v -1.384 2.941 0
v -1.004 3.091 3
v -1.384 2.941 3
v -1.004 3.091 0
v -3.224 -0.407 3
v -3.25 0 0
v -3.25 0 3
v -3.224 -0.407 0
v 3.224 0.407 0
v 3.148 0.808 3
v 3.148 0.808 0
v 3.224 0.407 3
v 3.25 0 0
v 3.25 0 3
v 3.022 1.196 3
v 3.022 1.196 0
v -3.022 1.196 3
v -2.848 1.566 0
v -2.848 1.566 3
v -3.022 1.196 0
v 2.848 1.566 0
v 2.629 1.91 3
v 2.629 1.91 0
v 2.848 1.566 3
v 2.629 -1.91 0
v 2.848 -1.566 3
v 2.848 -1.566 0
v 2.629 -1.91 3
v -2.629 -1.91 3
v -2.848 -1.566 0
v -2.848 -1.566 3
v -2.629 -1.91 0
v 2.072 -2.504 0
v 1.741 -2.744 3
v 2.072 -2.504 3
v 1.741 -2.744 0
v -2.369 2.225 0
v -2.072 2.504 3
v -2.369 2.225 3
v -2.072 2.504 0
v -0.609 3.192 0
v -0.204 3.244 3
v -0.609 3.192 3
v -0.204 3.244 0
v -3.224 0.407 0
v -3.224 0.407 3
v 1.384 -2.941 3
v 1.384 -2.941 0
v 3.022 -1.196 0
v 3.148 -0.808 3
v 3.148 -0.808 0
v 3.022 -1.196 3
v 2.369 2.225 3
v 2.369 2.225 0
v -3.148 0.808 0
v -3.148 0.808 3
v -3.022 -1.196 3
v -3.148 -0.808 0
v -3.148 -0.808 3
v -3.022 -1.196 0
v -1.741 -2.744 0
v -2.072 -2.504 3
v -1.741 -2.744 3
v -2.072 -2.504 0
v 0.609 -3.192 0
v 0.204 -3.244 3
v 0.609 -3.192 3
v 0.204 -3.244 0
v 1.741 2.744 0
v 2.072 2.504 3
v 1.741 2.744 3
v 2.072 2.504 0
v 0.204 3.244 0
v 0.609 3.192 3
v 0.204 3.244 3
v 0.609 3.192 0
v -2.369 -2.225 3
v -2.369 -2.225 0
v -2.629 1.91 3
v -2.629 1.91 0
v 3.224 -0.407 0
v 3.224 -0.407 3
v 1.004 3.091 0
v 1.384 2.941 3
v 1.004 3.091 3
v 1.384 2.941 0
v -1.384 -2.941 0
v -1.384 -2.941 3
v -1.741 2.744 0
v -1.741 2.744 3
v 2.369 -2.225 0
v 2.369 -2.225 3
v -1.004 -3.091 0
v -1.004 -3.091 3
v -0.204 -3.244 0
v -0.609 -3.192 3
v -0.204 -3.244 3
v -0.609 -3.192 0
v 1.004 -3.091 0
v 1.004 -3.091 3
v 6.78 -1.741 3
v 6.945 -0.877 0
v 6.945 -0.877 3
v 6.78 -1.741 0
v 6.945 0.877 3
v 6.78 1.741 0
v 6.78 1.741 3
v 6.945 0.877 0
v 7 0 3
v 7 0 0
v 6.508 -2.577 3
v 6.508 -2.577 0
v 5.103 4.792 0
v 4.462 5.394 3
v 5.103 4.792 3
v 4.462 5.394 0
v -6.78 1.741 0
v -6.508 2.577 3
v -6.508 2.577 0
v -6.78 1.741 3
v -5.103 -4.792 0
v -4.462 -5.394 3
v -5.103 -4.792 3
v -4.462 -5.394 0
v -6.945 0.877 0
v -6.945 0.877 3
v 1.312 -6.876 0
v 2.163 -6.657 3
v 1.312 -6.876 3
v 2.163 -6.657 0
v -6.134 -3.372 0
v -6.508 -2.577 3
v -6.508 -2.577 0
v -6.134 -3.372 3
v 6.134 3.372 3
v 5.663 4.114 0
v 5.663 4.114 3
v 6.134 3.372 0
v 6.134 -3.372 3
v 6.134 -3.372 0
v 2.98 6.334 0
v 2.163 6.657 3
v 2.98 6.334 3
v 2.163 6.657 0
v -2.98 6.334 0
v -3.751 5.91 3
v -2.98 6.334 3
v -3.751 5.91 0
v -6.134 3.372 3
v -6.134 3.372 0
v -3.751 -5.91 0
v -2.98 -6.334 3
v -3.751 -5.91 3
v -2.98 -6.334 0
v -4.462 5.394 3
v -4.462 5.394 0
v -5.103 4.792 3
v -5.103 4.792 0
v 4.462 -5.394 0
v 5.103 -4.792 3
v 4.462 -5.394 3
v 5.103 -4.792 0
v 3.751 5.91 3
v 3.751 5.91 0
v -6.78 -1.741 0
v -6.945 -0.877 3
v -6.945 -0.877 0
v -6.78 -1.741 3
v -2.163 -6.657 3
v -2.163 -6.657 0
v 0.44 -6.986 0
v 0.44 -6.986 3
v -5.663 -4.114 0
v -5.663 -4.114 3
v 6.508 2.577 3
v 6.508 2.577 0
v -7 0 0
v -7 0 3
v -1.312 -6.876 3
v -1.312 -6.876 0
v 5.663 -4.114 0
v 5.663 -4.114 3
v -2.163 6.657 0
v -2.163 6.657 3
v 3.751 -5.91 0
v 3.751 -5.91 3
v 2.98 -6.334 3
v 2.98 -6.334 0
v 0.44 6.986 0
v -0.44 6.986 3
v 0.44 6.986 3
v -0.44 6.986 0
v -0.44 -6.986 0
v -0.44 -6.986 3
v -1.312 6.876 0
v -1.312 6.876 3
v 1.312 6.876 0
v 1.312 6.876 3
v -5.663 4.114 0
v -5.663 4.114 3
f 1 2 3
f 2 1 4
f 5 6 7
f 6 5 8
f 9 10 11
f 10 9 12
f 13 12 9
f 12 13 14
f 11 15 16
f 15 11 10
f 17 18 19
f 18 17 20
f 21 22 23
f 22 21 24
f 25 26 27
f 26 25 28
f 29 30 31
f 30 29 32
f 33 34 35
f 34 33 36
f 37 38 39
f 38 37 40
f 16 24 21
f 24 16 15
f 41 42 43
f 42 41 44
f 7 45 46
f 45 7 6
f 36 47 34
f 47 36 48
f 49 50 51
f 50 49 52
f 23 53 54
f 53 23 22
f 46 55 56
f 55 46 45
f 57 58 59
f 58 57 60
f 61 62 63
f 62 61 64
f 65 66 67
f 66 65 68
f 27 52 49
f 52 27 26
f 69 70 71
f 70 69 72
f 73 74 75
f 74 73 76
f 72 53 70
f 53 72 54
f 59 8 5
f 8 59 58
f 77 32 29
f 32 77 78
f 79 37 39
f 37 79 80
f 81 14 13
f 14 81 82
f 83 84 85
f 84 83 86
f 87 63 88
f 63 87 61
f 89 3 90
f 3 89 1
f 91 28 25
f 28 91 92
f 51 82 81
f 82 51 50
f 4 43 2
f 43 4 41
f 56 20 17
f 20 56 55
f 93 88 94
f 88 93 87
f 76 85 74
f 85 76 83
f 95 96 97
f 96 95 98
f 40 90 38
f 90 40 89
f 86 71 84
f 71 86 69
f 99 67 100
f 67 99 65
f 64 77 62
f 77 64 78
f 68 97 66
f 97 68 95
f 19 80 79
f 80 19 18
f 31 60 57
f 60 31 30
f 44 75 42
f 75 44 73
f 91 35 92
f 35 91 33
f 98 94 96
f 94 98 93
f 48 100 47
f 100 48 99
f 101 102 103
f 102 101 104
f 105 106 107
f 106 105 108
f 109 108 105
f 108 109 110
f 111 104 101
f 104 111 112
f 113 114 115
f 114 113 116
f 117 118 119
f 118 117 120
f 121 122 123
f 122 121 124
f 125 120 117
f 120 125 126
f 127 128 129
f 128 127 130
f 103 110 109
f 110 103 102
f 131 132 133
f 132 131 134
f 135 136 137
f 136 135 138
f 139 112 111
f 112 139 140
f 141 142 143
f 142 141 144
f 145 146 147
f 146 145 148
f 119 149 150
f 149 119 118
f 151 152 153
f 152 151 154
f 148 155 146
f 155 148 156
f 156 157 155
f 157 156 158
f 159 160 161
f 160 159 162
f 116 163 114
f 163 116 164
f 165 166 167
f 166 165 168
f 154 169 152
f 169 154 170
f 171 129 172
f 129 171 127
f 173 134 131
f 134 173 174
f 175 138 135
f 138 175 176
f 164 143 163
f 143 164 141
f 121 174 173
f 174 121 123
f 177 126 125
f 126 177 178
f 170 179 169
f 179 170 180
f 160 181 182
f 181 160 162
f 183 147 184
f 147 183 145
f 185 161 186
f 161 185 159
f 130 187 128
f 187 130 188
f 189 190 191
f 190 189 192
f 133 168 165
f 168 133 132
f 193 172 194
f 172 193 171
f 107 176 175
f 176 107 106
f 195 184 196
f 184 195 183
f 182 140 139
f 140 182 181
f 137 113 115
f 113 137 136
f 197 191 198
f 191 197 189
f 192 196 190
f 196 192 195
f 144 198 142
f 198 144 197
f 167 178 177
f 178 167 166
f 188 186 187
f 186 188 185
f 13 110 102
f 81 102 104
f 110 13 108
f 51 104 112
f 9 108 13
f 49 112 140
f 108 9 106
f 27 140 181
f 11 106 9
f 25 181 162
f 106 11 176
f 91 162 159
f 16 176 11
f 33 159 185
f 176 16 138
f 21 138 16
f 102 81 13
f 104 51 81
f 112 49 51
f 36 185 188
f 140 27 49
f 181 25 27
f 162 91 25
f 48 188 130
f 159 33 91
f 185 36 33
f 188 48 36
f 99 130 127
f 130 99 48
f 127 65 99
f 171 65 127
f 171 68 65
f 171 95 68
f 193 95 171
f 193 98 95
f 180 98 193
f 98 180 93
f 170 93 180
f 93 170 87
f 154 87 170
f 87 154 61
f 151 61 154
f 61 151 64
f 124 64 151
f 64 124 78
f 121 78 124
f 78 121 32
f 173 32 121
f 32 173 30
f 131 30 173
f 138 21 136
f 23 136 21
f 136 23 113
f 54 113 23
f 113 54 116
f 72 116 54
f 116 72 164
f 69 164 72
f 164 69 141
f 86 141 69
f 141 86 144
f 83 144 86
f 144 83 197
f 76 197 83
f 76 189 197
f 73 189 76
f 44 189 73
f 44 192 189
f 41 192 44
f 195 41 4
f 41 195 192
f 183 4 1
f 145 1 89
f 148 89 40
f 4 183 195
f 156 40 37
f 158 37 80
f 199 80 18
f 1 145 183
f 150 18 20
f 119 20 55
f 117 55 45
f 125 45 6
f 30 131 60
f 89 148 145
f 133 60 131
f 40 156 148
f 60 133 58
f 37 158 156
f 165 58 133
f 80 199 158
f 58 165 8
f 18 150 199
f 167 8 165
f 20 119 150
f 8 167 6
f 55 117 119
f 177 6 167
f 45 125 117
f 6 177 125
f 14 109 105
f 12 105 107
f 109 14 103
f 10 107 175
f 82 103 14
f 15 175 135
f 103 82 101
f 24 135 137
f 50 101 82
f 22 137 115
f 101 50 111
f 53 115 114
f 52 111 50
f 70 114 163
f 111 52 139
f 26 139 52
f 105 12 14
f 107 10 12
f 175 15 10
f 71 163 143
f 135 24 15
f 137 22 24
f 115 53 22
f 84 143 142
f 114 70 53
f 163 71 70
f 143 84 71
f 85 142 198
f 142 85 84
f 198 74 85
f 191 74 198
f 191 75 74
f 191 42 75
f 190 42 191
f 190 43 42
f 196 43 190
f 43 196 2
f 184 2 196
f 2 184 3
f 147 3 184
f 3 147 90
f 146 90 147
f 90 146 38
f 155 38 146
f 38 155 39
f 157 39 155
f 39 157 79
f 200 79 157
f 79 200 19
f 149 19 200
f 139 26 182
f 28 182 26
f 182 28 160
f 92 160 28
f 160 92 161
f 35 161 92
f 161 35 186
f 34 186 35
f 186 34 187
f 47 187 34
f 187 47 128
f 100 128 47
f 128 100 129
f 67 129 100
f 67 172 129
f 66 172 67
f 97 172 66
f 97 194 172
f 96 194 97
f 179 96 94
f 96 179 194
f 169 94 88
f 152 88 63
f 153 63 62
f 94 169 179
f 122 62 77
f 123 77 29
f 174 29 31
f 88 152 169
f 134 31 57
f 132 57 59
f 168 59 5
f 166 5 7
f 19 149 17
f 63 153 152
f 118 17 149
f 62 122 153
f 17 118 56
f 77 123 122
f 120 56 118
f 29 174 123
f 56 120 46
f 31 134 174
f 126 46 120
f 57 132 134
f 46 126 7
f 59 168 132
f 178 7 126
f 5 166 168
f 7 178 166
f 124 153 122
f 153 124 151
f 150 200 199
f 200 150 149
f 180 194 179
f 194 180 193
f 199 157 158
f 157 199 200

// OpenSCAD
$fn = 50;


difference() {
	union() {
		cylinder(h = 3, r = 7.0000000000);
	}
	union() {
		translate(v = [0.0000000000, 0.0000000000, -100.0000000000]) {
			cylinder(h = 200, r = 3.2500000000);
		}
		translate(v = [0.0000000000, 0.0000000000, -100.0000000000]) {
			cylinder(h = 200, r = 3.2500000000);
		}
		translate(v = [0.0000000000, 0.0000000000, -100.0000000000]) {
			cylinder(h = 200, r = 3.2500000000);
		}
		translate(v = [0.0000000000, 0.0000000000, -100.0000000000]) {
			cylinder(h = 200, r = 3.2500000000);
		}
	}
}
